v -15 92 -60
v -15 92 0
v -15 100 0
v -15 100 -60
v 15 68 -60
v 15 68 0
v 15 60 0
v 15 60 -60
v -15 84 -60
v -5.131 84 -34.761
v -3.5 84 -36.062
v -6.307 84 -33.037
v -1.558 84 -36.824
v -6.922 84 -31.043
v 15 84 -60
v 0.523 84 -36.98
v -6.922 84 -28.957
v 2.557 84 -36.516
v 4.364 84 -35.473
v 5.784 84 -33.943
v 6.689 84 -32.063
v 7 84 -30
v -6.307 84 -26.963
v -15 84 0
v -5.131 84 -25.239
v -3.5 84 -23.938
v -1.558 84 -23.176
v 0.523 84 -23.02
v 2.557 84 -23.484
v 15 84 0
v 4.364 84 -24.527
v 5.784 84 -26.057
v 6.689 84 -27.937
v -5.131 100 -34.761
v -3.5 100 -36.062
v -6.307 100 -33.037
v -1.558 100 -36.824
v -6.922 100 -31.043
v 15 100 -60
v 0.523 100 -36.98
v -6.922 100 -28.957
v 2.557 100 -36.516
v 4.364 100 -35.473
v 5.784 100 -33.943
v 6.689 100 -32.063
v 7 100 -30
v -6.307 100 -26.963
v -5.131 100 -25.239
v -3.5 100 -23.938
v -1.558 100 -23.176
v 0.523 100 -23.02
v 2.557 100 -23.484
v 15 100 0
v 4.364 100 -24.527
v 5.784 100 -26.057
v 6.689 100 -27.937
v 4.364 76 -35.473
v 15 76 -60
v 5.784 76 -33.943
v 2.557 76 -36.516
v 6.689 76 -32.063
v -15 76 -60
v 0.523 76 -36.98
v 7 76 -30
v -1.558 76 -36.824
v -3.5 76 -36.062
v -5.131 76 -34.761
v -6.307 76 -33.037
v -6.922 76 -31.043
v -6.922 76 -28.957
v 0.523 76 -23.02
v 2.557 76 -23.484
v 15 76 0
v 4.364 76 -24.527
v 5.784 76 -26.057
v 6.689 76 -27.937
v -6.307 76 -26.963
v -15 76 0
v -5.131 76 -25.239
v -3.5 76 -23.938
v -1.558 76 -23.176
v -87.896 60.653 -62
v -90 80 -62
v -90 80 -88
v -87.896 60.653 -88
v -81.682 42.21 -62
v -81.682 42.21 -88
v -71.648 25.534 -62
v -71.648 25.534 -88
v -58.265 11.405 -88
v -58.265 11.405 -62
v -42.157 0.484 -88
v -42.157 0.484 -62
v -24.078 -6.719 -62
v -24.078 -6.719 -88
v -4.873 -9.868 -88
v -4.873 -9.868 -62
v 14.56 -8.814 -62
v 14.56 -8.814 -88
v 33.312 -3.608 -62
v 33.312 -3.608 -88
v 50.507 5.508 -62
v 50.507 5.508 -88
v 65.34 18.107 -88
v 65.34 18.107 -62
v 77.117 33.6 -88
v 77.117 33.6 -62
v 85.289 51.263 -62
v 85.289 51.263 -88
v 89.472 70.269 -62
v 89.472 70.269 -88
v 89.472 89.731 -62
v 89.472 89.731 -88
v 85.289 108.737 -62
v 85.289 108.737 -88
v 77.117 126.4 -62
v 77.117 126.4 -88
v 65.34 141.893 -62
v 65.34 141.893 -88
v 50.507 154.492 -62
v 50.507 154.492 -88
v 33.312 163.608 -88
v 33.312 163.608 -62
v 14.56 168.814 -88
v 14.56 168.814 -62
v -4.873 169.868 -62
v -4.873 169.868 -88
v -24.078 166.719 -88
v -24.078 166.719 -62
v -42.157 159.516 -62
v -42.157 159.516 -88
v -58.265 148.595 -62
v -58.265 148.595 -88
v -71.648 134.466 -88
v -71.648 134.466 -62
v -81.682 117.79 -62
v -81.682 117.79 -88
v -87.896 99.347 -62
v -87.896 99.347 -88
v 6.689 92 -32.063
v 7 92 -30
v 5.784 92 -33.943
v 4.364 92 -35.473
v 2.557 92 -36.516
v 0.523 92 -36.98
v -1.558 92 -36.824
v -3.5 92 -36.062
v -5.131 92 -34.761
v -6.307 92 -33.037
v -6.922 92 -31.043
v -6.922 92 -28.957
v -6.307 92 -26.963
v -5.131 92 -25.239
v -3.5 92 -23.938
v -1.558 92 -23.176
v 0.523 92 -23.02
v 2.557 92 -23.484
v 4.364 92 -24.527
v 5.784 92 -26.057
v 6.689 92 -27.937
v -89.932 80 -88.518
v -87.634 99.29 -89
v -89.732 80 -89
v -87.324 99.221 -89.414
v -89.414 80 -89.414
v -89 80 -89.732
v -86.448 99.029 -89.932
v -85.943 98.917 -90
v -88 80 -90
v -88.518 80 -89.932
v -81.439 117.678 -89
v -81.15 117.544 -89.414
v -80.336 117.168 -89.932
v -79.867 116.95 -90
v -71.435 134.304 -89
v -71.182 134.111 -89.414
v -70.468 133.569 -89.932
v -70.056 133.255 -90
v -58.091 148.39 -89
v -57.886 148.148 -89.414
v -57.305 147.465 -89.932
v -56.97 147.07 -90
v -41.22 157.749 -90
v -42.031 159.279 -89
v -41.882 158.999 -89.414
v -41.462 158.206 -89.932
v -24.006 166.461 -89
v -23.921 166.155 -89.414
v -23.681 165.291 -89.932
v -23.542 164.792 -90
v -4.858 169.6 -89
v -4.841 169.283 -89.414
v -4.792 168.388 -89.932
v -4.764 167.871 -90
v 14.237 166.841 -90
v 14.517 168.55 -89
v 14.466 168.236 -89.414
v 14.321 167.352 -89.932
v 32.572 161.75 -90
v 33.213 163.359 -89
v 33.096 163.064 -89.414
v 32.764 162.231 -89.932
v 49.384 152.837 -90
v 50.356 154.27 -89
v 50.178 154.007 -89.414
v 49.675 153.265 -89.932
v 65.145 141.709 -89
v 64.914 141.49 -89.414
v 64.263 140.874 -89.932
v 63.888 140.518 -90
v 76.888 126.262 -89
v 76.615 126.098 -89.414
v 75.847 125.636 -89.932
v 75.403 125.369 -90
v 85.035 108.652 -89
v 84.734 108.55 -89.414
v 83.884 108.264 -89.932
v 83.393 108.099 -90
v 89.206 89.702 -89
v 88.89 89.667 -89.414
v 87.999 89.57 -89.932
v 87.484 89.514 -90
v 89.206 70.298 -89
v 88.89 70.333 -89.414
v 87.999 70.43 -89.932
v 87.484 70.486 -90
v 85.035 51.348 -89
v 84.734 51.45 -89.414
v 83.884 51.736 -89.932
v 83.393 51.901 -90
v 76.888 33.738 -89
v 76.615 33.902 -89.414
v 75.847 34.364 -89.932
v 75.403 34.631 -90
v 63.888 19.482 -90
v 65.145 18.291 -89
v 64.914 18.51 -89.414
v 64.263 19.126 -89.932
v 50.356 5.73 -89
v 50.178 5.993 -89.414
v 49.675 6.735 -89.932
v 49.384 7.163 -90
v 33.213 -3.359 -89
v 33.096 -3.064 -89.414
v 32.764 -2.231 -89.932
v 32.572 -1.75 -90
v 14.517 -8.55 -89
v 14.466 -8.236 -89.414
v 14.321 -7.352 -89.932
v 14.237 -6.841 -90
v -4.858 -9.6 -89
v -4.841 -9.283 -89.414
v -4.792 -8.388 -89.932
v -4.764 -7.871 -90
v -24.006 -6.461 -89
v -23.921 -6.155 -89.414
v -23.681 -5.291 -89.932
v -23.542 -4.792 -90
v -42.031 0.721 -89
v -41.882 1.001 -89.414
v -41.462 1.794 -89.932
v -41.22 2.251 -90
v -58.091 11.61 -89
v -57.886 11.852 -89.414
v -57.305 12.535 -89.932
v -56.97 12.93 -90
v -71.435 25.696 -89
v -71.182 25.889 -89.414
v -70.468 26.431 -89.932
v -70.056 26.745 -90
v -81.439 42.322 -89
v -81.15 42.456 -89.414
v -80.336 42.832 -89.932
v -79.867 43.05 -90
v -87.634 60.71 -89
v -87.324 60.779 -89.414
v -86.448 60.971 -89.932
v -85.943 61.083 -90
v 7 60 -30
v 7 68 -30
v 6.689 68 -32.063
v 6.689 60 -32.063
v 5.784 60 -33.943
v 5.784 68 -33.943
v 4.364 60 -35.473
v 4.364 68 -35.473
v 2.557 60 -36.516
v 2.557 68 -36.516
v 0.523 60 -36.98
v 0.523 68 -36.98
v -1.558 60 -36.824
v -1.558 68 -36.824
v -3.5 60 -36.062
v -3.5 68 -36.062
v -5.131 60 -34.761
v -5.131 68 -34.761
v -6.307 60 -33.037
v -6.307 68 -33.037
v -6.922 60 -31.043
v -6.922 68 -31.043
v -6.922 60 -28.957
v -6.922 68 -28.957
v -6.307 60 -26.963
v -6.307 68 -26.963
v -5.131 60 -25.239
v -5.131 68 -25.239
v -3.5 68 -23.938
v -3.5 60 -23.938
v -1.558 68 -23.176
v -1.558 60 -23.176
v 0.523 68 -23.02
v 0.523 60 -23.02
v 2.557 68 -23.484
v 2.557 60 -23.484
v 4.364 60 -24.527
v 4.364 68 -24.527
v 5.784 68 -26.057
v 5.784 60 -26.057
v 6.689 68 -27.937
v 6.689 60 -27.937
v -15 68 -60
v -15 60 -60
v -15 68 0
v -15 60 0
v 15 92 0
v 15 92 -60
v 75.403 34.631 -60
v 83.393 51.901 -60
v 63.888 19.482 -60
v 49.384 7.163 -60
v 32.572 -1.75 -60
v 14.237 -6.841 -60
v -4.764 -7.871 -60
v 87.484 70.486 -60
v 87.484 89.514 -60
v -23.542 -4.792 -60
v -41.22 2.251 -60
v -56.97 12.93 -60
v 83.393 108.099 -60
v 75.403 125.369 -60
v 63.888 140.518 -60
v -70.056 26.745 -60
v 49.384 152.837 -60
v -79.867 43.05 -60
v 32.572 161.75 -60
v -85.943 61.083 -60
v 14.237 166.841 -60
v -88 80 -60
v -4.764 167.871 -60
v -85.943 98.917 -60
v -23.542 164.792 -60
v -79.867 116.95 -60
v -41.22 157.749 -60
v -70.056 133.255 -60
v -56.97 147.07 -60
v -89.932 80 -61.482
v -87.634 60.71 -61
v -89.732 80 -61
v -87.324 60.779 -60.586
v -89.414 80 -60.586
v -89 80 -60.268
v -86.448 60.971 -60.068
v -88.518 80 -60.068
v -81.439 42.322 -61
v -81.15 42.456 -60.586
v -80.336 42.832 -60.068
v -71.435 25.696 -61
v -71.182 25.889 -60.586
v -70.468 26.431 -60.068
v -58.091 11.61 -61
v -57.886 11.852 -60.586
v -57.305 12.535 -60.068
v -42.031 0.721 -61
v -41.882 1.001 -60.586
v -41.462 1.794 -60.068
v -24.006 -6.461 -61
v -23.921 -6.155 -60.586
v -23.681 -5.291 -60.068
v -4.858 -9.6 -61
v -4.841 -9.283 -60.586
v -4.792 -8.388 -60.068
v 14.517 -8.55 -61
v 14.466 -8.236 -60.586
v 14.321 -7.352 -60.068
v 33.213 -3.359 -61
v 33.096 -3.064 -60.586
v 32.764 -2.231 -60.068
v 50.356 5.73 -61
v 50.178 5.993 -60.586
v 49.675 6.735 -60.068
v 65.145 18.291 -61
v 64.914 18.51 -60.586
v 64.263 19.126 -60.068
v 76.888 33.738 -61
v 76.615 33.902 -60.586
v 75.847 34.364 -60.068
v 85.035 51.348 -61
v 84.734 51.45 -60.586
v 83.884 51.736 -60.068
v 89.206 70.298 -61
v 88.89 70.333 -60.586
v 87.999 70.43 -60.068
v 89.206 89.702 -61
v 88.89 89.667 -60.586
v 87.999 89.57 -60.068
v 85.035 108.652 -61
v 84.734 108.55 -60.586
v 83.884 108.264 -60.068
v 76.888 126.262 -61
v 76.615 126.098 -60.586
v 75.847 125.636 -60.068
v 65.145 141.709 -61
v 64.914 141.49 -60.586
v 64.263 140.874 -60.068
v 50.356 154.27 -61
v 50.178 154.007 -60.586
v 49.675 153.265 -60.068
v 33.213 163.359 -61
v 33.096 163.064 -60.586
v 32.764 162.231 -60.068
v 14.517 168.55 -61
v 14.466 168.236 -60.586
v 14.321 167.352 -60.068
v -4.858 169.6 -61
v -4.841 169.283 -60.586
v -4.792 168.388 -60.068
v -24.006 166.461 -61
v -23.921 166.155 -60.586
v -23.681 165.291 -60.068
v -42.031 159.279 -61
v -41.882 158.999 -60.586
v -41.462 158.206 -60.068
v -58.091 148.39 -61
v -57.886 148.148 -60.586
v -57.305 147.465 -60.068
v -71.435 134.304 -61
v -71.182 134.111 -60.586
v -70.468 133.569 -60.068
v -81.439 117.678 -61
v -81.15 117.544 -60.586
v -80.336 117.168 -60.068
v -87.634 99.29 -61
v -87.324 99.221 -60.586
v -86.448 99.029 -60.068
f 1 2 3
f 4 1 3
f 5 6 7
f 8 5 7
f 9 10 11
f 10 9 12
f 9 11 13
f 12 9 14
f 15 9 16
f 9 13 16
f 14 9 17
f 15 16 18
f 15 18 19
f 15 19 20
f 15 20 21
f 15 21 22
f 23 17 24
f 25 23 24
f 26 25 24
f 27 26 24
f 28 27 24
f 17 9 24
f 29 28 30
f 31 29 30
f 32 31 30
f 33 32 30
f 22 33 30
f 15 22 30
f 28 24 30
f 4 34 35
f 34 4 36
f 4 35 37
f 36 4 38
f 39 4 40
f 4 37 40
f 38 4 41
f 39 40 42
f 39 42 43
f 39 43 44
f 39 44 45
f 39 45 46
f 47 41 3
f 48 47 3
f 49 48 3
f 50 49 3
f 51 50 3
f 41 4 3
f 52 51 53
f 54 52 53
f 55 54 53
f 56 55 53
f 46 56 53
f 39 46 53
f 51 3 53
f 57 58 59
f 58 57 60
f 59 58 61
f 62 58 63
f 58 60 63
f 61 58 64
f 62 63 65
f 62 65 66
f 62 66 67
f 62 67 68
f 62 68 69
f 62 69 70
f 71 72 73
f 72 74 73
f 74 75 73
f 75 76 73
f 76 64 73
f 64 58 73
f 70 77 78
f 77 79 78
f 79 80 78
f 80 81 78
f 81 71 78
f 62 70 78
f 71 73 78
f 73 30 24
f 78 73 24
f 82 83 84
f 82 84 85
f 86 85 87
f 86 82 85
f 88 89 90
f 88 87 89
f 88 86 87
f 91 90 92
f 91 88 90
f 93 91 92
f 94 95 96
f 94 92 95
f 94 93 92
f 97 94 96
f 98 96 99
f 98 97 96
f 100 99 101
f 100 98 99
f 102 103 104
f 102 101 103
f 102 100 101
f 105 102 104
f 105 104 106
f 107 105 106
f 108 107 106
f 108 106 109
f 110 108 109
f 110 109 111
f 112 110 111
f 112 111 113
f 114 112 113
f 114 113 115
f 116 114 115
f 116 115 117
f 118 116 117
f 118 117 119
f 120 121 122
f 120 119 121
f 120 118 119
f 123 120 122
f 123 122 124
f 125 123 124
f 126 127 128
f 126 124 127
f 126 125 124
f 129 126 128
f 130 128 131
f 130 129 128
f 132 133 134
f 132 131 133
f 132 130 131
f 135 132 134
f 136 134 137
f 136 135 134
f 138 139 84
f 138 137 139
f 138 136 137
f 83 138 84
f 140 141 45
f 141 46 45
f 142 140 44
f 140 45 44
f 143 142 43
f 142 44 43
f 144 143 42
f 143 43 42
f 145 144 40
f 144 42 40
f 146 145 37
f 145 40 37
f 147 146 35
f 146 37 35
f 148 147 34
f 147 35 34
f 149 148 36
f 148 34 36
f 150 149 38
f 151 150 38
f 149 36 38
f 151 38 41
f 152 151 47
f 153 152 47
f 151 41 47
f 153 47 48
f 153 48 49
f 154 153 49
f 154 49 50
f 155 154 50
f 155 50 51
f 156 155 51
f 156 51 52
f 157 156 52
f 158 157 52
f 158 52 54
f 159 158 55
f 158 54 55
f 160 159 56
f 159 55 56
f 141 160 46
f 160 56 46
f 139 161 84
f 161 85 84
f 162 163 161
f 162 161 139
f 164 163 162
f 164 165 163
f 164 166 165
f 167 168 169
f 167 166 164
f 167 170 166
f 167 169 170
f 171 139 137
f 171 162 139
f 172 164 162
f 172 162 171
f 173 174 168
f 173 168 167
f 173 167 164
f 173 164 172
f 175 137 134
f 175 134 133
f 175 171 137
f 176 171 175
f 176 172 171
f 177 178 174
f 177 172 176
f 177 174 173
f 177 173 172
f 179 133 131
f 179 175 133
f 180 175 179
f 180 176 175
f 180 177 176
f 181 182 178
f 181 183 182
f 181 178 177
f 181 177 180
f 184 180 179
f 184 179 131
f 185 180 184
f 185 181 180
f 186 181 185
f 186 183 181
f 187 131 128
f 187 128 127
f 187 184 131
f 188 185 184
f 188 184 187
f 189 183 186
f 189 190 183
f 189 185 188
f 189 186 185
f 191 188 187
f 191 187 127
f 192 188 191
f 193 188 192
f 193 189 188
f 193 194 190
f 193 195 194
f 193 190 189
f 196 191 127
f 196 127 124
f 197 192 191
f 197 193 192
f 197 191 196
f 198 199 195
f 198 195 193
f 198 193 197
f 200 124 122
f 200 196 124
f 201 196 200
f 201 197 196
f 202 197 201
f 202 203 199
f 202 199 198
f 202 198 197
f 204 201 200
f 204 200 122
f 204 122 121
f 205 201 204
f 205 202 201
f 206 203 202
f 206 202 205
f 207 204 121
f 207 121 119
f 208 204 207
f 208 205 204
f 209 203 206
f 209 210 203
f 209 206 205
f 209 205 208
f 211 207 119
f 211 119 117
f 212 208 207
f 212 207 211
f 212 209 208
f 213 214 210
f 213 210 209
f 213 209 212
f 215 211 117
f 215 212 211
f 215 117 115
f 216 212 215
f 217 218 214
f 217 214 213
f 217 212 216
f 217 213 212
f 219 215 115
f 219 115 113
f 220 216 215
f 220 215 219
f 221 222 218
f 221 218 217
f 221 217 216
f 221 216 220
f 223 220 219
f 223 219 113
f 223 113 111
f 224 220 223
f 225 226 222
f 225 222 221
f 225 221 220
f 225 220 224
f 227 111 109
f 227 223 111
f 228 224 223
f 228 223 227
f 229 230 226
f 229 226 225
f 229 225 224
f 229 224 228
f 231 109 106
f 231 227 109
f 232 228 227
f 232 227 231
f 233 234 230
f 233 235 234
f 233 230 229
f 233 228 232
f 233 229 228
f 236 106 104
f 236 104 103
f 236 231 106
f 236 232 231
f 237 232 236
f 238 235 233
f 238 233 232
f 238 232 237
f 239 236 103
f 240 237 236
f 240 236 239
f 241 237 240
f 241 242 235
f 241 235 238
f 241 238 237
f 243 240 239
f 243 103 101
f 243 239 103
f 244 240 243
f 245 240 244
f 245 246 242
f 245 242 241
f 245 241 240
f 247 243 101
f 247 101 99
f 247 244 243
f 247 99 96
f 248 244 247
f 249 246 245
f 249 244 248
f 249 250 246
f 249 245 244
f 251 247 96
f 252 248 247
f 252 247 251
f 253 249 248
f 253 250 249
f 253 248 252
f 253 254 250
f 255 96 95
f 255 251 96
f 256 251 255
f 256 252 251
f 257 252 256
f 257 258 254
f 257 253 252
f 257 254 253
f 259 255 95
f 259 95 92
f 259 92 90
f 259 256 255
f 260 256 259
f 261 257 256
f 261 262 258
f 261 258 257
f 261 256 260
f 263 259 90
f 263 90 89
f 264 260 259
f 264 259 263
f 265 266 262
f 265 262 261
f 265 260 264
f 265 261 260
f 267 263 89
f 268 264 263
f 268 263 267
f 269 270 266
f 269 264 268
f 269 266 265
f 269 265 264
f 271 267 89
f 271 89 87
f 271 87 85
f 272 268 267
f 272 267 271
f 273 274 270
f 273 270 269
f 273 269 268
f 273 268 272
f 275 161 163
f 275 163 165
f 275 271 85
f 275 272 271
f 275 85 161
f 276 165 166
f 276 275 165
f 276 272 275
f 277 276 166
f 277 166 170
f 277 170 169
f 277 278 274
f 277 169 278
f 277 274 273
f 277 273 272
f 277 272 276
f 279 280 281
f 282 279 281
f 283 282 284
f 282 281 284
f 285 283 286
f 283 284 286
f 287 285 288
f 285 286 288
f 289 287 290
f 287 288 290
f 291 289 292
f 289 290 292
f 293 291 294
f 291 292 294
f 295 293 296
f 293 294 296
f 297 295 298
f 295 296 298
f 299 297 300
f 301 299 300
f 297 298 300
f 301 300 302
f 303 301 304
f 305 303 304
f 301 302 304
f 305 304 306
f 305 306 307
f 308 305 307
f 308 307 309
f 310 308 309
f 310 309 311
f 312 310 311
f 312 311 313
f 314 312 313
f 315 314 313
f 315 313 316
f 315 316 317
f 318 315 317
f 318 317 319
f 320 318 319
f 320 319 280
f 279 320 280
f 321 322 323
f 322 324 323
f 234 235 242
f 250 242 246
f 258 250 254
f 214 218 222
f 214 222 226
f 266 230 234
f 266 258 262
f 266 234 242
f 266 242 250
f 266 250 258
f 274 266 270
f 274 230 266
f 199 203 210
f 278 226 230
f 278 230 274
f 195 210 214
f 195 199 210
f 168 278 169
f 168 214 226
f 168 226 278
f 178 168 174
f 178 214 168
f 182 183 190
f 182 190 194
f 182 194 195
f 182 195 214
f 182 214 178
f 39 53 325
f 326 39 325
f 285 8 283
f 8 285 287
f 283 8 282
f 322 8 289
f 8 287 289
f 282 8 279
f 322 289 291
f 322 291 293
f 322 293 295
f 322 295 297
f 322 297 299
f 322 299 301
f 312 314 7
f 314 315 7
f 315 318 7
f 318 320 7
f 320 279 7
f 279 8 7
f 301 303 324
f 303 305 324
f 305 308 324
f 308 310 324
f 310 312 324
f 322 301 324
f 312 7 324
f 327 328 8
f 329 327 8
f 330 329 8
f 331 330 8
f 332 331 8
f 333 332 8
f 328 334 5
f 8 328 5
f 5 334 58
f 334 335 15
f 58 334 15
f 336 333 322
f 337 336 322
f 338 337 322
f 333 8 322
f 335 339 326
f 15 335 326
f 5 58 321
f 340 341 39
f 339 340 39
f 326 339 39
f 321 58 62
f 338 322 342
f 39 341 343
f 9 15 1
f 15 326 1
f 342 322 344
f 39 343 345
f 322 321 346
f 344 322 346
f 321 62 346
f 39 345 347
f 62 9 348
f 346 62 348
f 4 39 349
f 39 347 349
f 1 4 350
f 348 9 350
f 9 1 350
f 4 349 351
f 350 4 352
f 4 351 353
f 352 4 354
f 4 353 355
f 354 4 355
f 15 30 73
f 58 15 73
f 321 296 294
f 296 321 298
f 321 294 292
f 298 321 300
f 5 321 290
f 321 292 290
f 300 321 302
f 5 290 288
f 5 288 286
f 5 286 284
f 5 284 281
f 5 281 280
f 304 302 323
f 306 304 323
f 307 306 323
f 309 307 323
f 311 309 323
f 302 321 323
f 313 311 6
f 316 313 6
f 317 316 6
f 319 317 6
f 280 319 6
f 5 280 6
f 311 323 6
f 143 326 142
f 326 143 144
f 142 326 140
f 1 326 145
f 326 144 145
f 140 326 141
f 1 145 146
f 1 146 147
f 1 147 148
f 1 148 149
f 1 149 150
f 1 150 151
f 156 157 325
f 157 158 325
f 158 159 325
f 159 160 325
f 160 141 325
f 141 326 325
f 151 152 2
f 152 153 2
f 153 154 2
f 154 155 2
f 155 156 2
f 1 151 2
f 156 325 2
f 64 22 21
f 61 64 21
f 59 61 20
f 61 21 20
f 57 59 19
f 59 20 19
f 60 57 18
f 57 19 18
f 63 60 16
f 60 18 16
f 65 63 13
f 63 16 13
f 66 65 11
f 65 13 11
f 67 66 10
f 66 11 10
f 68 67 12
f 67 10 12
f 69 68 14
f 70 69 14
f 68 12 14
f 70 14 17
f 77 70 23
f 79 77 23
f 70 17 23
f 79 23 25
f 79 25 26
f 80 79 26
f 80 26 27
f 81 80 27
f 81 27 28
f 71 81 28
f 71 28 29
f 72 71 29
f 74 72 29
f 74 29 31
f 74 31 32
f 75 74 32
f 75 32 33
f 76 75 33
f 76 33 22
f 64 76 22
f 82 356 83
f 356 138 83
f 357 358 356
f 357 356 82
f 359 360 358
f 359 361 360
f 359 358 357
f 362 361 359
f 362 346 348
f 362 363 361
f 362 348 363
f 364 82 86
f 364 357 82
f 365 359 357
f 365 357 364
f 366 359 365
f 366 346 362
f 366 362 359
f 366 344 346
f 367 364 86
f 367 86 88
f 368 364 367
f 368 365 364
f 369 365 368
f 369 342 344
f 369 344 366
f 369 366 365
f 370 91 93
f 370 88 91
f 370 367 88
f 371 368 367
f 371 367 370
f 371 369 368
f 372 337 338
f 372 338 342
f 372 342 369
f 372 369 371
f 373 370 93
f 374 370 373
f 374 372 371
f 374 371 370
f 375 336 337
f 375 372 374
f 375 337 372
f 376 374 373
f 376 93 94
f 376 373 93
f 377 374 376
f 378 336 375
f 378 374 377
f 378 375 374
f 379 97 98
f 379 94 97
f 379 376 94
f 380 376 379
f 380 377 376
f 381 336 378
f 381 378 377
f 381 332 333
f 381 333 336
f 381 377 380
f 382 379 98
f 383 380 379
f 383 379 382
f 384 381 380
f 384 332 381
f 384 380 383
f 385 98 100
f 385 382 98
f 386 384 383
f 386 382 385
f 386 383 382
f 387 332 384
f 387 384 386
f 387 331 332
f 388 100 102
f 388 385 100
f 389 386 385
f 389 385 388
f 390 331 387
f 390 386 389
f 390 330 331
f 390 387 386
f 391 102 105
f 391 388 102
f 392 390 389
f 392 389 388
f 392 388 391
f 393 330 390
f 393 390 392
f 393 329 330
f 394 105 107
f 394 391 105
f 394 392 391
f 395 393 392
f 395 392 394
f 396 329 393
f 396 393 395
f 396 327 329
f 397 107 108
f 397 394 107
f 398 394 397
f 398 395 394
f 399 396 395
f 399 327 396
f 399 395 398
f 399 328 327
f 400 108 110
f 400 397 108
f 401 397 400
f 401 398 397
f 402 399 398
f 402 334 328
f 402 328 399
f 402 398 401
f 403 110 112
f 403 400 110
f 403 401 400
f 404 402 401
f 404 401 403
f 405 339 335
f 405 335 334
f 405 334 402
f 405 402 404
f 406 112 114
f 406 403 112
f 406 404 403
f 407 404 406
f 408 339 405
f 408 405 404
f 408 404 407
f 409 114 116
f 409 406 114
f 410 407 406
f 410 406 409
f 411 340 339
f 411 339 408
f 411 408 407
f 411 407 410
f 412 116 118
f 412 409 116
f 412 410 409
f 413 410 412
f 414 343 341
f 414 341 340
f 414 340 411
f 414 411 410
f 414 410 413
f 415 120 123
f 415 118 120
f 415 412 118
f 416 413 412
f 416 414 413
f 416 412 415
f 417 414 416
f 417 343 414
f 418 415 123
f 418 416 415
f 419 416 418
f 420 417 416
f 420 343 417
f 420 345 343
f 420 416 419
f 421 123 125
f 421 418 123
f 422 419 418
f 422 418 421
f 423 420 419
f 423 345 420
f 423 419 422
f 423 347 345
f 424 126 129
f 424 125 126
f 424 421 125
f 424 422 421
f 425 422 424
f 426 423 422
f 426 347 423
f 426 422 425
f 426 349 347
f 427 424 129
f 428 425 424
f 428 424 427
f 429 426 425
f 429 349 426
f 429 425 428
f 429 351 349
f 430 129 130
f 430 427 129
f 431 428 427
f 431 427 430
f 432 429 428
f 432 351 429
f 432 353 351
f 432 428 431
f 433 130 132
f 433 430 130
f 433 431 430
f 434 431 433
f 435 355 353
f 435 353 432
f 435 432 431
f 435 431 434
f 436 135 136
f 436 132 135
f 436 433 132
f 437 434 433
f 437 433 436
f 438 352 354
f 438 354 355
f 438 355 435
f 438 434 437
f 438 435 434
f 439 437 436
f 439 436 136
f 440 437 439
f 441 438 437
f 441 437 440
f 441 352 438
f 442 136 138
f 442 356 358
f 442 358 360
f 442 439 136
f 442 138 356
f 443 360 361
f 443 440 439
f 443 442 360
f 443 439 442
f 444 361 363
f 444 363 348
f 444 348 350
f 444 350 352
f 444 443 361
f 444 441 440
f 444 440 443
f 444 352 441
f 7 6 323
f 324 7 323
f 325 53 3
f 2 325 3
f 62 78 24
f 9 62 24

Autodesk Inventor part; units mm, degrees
ref_plane "Arbeitsebene1" through (0, 0, 0) normal (0, 0, -1) x (-1, 0, 0)
sketch "Skizze3" plane through (0, 0, 0) normal (0, 0, -1) x (-1, 0, 0)
  point P0 (0, 0)
ref_plane "Arbeitsebene4" through (0, 0, 0) normal (0, 0, -1) x (-1, 0, 0)
sketch "Skizze4" plane through (0, 0, 0) normal (0, 0, -1) x (-1, 0, 0)
  line L0 (15, 68) -> (-15, 68)
  line L1 (-15, 68) -> (-15, 60)
  line L2 (-15, 60) -> (15, 60)
  line L3 (15, 60) -> (15, 68)
  line L4 (-15, 76) -> (15, 76)
  line L5 (15, 76) -> (15, 84)
  line L6 (15, 84) -> (-15, 84)
  line L7 (-15, 84) -> (-15, 76)
  line L8 (-15, 92) -> (15, 92)
  line L9 (15, 92) -> (15, 100)
  line L10 (15, 100) -> (-15, 100)
  line L11 (-15, 100) -> (-15, 92)
  point P0 (0, 0)
  dimension "d7" = 30
  dimension "d8" = 8
  dimension "d9" = 30
  dimension "d10" = 8
  dimension "d11" = 8
extrude "Extrusion3" add sketch "Skizze4" along normal blind 60
ref_plane "Arbeitsebene3" through (-15, 100, 0) normal (0, 1, 0) x (1, 0, 0)
sketch "Skizze5" plane through (-15, 100, 0) normal (0, 1, 0) x (1, 0, 0)
  circle A0 centre (15, 30) radius 7
  line L0 (0, 60) -> (30, 60) projected
  arc A1 (30, 60) -> (0, 60) centre (15, 60) ccw
  point P0 (15, 0)
  dimension "d14" = 14
  dimension "d15" = 15
extrude "Extrusion4" cut sketch "Skizze5" against normal blind 40 contours A0
sketch "Skizze6" plane through (0, 0, -60) normal (0, 0, -1) x (-1, 0, 0)
  circle A0 centre (0, 80) radius 90
  point P0 (0, 0)
  point P1 (-15, 76)
  dimension "d19" = 180
extrude "Extrusion5" add sketch "Skizze6" along normal blind 30
fillet "Rundung1" radius 2 2 edges at (90, 80, -90) (90, 80, -60)
sketch "Skizze8" plane through (0, 80, -90) normal (0, 0, -1) x (-1, 0, 0)
  point P0 (0, -80)
properties part number "Press_Stempel"
